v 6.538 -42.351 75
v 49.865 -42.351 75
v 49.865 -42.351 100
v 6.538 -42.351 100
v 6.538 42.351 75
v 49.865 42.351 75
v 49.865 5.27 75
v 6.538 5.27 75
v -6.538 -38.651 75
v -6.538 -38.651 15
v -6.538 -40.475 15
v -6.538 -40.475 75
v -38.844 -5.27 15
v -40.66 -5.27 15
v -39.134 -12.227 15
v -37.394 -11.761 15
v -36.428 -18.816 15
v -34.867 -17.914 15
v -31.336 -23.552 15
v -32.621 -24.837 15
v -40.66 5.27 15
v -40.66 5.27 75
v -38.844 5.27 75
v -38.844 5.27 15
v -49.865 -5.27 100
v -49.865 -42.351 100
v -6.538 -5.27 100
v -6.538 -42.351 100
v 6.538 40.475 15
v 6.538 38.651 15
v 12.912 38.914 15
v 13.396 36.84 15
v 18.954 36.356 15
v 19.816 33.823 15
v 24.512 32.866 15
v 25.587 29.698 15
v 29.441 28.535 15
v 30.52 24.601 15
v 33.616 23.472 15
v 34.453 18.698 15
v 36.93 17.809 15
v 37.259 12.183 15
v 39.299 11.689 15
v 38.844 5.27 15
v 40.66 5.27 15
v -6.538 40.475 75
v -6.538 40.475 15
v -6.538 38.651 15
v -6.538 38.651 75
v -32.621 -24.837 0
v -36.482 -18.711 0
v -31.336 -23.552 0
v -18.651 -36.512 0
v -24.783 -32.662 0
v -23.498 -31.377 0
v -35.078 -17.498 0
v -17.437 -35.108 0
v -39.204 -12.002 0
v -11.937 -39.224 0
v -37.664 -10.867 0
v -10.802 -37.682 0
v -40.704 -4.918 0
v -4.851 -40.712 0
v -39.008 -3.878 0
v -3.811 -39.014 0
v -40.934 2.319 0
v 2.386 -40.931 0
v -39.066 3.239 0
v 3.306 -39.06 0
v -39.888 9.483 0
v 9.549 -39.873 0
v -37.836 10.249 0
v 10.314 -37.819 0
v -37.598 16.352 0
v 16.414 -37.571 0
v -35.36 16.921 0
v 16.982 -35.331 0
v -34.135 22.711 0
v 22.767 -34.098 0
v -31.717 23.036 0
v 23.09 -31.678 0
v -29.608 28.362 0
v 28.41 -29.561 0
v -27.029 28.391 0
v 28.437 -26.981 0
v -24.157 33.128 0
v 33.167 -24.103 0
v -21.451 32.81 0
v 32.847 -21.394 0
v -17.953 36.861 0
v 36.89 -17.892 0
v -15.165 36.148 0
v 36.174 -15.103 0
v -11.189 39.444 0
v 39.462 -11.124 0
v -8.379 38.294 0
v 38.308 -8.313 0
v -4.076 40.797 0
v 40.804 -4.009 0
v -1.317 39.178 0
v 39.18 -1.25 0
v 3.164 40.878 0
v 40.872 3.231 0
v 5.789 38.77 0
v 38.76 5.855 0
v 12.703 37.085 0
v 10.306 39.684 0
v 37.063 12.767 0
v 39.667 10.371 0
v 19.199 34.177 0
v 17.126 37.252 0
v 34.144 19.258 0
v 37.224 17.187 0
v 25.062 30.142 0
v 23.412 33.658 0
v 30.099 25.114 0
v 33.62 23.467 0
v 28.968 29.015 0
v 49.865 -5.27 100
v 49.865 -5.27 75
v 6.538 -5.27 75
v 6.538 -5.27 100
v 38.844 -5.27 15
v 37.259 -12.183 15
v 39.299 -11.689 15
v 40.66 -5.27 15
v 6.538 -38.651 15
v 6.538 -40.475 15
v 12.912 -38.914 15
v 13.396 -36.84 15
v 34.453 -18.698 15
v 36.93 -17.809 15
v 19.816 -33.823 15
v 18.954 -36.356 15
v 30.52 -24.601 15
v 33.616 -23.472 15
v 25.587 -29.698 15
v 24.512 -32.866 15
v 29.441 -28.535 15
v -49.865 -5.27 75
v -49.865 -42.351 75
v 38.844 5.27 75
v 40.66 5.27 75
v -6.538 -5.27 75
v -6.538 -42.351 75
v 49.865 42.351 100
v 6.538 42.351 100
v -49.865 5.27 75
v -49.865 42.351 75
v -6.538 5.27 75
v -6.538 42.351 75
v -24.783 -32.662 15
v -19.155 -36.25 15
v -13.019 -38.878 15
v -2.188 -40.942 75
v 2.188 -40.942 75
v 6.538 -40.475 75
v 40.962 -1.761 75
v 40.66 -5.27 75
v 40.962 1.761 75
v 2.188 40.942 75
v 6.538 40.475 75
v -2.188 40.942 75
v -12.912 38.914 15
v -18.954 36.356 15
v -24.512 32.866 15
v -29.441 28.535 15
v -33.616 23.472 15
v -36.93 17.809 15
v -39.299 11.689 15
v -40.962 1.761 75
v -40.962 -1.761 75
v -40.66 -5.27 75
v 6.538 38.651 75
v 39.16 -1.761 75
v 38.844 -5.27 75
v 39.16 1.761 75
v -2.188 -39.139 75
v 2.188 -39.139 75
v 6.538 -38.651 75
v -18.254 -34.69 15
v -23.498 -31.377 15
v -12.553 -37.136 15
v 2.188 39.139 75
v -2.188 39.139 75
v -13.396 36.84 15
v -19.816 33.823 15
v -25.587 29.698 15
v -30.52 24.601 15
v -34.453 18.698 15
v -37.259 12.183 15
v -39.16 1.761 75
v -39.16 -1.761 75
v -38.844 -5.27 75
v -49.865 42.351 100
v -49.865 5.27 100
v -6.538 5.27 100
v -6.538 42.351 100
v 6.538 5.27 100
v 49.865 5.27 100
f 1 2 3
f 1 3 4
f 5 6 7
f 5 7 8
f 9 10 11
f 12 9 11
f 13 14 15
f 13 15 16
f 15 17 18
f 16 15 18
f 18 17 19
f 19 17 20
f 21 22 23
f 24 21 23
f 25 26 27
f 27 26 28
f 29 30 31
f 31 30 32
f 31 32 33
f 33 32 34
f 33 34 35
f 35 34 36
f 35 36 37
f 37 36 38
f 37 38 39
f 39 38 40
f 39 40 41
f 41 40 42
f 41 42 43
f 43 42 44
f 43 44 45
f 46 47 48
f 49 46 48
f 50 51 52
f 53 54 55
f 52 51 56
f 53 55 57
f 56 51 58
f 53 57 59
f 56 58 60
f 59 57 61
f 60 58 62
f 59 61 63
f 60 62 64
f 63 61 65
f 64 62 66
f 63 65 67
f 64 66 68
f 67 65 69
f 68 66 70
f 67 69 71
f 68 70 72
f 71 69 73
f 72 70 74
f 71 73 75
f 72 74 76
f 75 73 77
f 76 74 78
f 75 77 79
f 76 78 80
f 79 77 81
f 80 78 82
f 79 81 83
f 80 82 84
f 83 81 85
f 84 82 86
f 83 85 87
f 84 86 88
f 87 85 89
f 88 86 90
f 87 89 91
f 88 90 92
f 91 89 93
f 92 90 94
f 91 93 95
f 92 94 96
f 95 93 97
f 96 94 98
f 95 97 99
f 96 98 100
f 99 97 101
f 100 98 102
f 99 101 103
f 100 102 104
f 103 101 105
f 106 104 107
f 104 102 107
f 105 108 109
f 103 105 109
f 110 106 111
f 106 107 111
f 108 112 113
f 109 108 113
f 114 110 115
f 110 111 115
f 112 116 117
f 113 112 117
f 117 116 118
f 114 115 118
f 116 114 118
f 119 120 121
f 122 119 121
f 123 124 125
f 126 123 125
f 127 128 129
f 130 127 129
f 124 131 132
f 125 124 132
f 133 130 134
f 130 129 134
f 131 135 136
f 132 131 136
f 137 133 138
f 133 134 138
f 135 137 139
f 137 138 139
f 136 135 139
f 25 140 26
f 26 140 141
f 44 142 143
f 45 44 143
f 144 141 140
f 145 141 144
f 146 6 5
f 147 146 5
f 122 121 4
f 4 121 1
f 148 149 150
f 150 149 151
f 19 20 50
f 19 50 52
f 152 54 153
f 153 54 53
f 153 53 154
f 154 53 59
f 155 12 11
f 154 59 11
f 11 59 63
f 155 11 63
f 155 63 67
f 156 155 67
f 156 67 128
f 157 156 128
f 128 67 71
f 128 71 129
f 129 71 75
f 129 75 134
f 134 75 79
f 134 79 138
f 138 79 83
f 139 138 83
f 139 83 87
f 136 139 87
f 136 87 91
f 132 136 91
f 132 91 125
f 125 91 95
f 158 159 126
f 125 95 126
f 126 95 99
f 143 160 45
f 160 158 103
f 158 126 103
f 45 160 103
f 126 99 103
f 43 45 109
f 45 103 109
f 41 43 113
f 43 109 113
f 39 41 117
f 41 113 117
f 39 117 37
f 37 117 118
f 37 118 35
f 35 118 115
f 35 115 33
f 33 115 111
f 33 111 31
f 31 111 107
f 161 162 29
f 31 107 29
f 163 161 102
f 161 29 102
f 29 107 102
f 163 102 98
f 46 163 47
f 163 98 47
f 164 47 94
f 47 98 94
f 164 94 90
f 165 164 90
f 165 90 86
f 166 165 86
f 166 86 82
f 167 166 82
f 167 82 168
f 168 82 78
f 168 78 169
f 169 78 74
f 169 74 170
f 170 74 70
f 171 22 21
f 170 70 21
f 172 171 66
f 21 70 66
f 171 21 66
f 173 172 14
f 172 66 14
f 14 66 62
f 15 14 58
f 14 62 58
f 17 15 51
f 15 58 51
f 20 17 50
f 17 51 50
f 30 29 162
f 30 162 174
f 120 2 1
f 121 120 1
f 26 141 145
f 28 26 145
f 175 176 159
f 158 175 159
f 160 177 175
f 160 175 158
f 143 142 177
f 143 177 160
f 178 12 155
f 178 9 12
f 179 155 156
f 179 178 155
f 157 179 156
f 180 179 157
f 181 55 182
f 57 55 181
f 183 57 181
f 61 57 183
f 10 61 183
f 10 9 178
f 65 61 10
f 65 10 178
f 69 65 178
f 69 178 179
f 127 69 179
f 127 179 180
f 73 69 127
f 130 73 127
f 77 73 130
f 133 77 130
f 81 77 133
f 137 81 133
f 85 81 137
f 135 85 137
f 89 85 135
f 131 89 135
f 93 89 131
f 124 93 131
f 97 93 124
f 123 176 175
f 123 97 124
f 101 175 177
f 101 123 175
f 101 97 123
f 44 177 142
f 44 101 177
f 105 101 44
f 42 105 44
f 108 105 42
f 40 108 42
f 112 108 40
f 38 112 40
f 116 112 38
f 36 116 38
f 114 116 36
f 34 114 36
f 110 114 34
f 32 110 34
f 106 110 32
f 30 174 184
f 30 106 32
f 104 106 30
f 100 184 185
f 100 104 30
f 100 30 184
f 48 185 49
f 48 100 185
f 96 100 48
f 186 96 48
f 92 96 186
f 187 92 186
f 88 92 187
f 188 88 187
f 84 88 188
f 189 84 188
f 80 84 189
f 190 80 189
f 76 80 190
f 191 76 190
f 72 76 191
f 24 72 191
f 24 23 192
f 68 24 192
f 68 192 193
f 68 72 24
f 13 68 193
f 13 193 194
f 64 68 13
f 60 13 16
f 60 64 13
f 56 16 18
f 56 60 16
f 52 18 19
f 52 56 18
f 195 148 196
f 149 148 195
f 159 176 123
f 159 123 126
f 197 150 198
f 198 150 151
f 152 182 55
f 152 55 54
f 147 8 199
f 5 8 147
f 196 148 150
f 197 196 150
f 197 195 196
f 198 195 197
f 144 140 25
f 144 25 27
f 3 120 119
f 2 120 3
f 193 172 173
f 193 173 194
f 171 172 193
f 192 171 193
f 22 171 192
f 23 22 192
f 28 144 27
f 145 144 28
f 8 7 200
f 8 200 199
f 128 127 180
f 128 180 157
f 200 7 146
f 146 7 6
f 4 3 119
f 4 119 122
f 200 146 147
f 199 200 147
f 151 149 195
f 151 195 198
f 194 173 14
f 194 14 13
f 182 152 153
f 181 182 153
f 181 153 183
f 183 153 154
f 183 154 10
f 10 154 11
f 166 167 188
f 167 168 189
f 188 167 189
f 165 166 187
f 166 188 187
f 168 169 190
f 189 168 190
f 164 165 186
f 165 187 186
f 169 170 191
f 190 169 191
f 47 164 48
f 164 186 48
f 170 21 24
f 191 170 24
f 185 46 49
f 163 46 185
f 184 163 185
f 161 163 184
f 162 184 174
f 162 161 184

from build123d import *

# Parameters (mm, degrees)
F0_R      = 41
F1_DEPTH  = 75
F2_T      = -1.8
F3_W      = 43.3271373622
F3_H      = 37.0817845687
F4_DEPTH  = 25
F5_FACE_W = 43.3271373622
F5_FACE_H = 37.0817845687
F4_FACE_W = 43.3271373622
F4_FACE_H = 37.0817845687
F6_FACE_W = 43.3271373622
F6_FACE_H = 37.0817845687
F7_DEPTH  = 60
F10_DEPTH = 25


with BuildPart() as f1:
    # F0 (on Top) → F1 (new body)
    with BuildSketch(Plane.XY):
        Circle(F0_R)
    extrude(amount=F1_DEPTH)

    # F2
    f2_openings = [f1.faces().sort_by_distance(p)[0] for p in [
        (0, 0, 75),
        (0, 0, 0),
    ]]
    offset(amount=F2_T, openings=f2_openings)

    # F5_face (on face) + F4_face (on face) + F6_face (on face) → F7 (cut)
    with BuildSketch(Plane(origin=(28.2016734127, 23.8104094751, 75), x_dir=(1, 0, 0), z_dir=(0, 0, -1))):
        Rectangle(F5_FACE_W, F5_FACE_H)
    with BuildSketch(Plane(origin=(-28.2016734127, 23.8104094751, 75), x_dir=(1, 0, 0), z_dir=(0, 0, -1))):
        Rectangle(F4_FACE_W, F4_FACE_H)
    with BuildSketch(Plane(origin=(-28.2016734127, -23.8104094751, 75), x_dir=(1, 0, 0), z_dir=(0, 0, -1))):
        Rectangle(F6_FACE_W, F6_FACE_H)
        with Locations((56.4033468254, 0)):
            Rectangle(F6_FACE_W, F6_FACE_H)
    extrude(amount=F7_DEPTH, mode=Mode.SUBTRACT)

    # F9 (on face) → F10 (cut)
    with BuildSketch(Plane(origin=(0, 0, 0), x_dir=(1, 0, 0), z_dir=(0, 0, -1))):
        with BuildLine():
            Line((-26.0766707361, 33.9554976672), (-29.992537573, 30.0396308303))
            Line((-29.992537573, 30.0396308303), (-27.9037735724, 30.0396308303))
            ThreePointArc((-27.9037735724, 30.0396308303), (-26.3760293541, 31.3895695337), (-24.7830693928, 32.6618963239))
            Line((-24.7830693928, 32.6618963239), (-26.0766707361, 33.9554976672))
        make_face()
        with BuildLine():
            ThreePointArc((-24.7830693928, 32.6618963239), (-26.3760293541, 31.3895695337), (-27.9037735724, 30.0396308303))
            Line((-27.9037735724, 30.0396308303), (-25.184530561, 30.0396308303))
            ThreePointArc((-25.184530561, 30.0396308303), (-24.3503464301, 30.7197107528), (-23.497806174, 31.3766331051))
            Line((-23.497806174, 31.3766331051), (-24.7830693928, 32.6618963239))
        make_face()
        with BuildLine():
            Line((-25.184530561, 30.0396308303), (-27.9037735724, 30.0396308303))
            ThreePointArc((-27.9037735724, 30.0396308303), (-28.9669254959, 29.0158099545), (-29.992537573, 27.9543858801))
            Line((-29.992537573, 27.9543858801), (-29.992537573, 25.2405960693))
            ThreePointArc((-29.992537573, 25.2405960693), (-27.6926866813, 27.7444607872), (-25.184530561, 30.0396308303))
        make_face()
        with BuildLine():
            Line((-29.992537573, 25.2405960693), (-29.992537573, 27.9543858801))
            ThreePointArc((-29.992537573, 27.9543858801), (-31.3456683019, 26.4281872005), (-32.6212227873, 24.8365823708))
            Line((-32.6212227873, 24.8365823708), (-31.3362602205, 23.551619804))
            ThreePointArc((-31.3362602205, 23.551619804), (-30.6760251647, 24.4053576105), (-29.992537573, 25.2405960693))
        make_face()
    extrude(amount=-F10_DEPTH, mode=Mode.SUBTRACT)


with BuildPart() as f4:
    # F3 (on face) → F4 (new body)
    with BuildSketch(Plane.XY.offset(75)):
        with Locations((-28.2016734127, 23.8104094751)):
            Rectangle(F3_W, F3_H)
    extrude(amount=F4_DEPTH)


with BuildPart() as f5_1:
    # F5: instance of F4
    add(f4.part.mirror(Plane.YZ))


with BuildPart() as f6_1:
    # F6: instance of F4
    add(f4.part.mirror(Plane.XZ))


with BuildPart() as f6_2:
    # F6: instance of F5_1
    add(f5_1.part.mirror(Plane.XZ))


solid = Compound([f1.part, f4.part, f5_1.part, f6_1.part, f6_2.part])
